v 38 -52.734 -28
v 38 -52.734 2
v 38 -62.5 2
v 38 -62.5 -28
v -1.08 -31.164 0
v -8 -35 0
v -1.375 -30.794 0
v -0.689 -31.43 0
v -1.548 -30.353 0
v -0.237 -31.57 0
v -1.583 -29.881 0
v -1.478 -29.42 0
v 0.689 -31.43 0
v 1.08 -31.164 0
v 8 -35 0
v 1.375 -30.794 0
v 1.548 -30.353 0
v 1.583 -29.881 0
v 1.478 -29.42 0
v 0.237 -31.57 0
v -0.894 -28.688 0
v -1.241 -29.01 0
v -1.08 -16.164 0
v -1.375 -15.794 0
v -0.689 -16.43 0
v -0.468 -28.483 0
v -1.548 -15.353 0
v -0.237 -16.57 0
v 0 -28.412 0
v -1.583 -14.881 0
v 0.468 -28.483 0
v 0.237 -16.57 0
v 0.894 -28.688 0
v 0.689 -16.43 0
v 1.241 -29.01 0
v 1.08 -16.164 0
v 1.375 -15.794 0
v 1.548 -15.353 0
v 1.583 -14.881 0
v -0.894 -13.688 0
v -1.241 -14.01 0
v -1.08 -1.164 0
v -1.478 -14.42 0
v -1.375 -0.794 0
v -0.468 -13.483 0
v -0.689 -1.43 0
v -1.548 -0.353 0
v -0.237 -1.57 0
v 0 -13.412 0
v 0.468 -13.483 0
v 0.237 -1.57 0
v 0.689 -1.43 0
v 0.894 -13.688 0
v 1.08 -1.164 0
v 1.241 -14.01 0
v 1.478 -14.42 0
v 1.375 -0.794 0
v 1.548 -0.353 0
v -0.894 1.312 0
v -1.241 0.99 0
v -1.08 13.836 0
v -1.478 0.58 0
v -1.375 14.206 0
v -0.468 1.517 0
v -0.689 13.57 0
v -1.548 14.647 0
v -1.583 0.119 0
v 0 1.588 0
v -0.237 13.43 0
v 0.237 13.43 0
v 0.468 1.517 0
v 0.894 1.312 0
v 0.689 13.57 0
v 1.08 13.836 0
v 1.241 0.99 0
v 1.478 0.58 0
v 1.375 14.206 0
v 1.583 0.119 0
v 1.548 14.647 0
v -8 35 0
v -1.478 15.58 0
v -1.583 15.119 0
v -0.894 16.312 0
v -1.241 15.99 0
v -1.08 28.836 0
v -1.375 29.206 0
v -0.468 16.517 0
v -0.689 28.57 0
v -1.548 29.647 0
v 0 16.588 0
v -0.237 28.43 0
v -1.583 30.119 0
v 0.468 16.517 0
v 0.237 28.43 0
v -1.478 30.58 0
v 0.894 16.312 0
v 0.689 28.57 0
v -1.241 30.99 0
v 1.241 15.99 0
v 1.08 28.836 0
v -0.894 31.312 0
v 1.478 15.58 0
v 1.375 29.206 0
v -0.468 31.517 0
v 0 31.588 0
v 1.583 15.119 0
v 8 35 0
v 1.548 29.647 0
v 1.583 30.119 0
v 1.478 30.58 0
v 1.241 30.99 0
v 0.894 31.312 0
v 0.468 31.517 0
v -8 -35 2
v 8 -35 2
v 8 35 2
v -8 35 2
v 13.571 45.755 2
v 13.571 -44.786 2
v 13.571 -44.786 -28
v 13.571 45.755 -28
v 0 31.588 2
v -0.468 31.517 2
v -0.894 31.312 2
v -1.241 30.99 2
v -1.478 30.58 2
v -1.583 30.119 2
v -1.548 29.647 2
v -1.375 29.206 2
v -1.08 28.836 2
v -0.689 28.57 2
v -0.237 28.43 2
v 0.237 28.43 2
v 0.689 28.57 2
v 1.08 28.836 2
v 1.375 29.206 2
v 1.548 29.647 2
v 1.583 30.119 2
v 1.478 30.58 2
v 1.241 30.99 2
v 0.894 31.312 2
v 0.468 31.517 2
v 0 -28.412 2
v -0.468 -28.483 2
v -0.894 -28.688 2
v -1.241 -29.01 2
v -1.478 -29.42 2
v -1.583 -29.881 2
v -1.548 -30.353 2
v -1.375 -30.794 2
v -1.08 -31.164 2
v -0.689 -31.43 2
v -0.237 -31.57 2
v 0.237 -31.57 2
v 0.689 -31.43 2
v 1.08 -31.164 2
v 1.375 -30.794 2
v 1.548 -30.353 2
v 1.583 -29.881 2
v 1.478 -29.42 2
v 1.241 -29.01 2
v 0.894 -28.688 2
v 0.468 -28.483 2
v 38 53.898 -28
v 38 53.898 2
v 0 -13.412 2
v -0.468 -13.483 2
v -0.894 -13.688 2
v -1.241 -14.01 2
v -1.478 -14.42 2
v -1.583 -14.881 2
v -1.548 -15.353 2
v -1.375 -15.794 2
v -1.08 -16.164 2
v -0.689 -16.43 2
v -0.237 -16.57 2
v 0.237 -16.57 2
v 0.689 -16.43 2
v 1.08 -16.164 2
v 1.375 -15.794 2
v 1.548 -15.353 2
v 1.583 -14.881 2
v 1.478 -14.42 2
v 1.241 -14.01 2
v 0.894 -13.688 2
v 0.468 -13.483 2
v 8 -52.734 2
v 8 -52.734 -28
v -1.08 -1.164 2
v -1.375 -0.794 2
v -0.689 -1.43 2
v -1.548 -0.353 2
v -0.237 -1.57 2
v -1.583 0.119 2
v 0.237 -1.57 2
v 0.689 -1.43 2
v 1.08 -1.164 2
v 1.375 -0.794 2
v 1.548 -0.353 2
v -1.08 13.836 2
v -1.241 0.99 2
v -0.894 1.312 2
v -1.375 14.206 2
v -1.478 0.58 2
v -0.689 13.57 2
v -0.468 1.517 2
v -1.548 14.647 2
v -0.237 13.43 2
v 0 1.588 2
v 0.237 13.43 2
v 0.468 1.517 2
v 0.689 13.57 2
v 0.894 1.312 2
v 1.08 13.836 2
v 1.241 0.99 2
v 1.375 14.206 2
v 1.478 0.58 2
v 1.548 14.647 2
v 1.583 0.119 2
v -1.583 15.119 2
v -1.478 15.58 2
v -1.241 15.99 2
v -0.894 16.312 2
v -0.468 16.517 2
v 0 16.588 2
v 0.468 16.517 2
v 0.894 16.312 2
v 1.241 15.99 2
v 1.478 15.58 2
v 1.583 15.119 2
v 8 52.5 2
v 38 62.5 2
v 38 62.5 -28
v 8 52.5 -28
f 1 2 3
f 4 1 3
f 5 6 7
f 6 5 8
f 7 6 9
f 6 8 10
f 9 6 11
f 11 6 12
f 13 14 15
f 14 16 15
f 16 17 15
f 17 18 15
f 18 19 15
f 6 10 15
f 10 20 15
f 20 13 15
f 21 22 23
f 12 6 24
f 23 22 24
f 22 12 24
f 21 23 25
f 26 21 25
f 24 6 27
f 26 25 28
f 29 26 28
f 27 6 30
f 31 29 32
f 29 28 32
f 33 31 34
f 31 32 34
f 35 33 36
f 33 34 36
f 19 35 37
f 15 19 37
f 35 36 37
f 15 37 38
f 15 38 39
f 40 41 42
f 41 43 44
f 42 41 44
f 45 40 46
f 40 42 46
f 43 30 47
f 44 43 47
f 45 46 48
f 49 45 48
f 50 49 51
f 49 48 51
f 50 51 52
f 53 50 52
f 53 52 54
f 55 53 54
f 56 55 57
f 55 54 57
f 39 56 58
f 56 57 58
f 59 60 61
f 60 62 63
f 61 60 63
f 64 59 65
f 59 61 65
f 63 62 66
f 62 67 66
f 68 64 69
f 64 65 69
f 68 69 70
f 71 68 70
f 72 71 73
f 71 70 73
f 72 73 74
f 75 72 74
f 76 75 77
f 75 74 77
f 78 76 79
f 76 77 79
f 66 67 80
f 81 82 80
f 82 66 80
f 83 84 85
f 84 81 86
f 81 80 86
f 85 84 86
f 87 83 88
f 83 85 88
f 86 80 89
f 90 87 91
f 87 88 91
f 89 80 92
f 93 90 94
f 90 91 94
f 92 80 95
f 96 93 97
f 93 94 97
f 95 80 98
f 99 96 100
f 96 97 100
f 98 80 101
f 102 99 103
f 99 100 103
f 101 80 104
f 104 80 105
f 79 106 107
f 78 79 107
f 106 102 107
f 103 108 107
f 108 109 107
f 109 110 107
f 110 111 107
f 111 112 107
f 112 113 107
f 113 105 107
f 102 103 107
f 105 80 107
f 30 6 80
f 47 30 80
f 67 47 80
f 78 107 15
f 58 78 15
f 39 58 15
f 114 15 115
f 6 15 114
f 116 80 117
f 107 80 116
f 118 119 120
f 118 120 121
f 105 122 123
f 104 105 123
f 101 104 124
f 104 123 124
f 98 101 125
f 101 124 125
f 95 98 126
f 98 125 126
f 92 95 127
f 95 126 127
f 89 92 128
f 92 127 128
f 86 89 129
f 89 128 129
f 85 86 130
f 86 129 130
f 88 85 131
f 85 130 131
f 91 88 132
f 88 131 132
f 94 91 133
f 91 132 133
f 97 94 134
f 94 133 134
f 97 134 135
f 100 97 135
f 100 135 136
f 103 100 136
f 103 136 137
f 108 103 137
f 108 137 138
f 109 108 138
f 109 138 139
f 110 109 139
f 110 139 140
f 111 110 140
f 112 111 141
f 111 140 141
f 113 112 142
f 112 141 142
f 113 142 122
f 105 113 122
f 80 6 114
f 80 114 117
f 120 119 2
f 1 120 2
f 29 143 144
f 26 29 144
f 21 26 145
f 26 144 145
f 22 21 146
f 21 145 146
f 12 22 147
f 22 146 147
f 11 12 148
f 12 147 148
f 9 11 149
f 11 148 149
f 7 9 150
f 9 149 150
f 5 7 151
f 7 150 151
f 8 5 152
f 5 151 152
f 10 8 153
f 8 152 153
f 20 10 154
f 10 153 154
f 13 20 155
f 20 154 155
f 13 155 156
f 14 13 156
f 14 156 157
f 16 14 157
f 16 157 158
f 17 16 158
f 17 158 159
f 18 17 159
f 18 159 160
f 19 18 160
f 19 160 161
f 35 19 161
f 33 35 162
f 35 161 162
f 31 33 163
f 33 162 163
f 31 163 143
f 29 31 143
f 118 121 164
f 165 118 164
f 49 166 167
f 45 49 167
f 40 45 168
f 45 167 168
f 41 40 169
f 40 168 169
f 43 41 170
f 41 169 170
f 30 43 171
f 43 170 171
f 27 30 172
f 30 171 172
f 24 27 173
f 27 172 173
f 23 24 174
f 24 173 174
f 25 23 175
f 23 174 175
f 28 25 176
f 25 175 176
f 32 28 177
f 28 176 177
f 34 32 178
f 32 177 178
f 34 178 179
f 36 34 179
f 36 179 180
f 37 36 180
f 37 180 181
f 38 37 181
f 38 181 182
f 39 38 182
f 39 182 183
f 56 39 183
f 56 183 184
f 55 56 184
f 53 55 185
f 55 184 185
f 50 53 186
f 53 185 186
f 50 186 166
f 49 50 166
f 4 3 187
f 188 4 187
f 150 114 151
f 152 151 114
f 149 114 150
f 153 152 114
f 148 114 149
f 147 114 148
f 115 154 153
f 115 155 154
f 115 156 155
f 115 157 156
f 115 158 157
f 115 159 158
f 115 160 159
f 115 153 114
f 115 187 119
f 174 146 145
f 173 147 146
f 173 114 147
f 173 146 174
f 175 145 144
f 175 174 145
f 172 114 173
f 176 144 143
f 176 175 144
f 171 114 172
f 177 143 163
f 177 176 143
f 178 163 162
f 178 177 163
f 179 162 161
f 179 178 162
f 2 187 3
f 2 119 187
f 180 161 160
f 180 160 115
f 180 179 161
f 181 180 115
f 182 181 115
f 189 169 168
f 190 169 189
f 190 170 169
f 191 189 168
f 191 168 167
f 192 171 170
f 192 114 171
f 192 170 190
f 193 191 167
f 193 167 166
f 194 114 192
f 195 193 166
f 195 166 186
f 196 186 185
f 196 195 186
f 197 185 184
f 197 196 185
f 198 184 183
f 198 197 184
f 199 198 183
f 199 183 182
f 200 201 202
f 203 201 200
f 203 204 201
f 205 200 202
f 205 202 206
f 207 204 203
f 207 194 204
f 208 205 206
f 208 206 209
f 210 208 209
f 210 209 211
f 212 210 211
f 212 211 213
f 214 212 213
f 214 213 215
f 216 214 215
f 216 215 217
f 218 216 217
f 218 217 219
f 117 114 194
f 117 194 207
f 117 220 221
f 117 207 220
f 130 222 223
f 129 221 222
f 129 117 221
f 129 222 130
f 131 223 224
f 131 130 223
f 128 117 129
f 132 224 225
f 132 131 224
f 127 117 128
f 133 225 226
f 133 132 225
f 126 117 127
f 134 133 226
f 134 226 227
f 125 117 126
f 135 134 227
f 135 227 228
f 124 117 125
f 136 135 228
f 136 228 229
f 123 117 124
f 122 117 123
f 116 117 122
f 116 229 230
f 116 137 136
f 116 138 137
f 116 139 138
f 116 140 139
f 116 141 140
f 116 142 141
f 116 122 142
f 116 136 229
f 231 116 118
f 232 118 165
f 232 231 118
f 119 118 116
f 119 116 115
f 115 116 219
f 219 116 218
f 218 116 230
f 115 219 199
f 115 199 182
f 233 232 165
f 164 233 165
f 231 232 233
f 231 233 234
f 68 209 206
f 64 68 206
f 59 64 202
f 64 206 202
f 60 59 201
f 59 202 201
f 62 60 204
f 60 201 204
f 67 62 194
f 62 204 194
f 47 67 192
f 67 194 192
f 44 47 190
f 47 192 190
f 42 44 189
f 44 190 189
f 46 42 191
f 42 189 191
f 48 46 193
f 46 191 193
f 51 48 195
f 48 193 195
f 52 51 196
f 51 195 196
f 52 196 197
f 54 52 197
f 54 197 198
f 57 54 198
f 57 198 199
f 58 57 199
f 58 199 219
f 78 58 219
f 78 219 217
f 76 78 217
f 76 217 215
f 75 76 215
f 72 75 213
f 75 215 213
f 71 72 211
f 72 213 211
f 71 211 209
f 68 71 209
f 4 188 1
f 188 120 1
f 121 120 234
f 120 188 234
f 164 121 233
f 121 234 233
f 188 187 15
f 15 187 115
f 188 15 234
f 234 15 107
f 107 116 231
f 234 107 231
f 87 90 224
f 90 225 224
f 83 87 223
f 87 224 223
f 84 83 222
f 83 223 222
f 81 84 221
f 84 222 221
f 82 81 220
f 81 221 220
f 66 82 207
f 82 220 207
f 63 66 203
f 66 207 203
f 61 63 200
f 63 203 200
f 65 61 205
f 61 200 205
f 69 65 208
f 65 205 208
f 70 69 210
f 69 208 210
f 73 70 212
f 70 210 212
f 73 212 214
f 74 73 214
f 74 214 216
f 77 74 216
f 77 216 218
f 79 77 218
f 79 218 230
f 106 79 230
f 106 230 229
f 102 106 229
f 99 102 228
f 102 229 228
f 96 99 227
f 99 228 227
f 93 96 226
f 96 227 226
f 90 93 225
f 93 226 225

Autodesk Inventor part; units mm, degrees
ref_plane "YZ Plane" through (0, 0, 0) normal (1, 0, 0) x (0, 1, 0)
ref_plane "XZ Plane" through (0, 0, 0) normal (0, 1, 0) x (-1, 0, 0)
ref_plane "XY Plane" through (0, 0, 0) normal (0, 0, 1) x (1, 0, 0)
sketch "Boceto1" plane through (0, 0, 0) normal (0, 0, 1) x (1, 0, 0)
  line L0 (-8, 35) -> (8, 35)
  line L1 (8, 35) -> (8, -35)
  line L2 (8, -35) -> (-8, -35)
  line L3 (-8, -35) -> (-8, 35)
  line L4 (-8, 35) -> (8, -35) construction
  line L5 (8, 35) -> (-8, -35) construction
  point P0 (0, 0)
  dimension "d0" = 16
  dimension "d1" = 70
extrude "Extrusión1" add sketch "Boceto1" along normal blind 2
sketch "Boceto2" plane through (0, 0, 2) normal (0, 0, 1) x (1, 0, 0)
  line L0 (38, -62.5) -> (8, -62.5)
  line L1 (8, -62.5) -> (8, 62.5)
  line L2 (8, 62.5) -> (38, 62.5)
  line L3 (38, 62.5) -> (38, -62.5)
  line L4 (38, -62.5) -> (8, 62.5) construction
  line L5 (8, -62.5) -> (38, 62.5) construction
  point P0 (0, 0)
  point P1 (23, 0)
  dimension "d4" = 30
  dimension "d5" = 125
extrude "Extrusión2" add sketch "Boceto2" against normal blind 30
sketch "Boceto3" plane through (0, 0, 2) normal (0, 0, 1) x (1, 0, 0)
  line L0 (38, 62.5) -> (38, -62.5) projected
  line L1 (13.5714, -44.7856) -> (13.5714, 45.755)
  line L2 (38, 45.755) -> (38, -44.7856)
  line L3 (13.5714, -44.7856) -> (38, -52.7345)
  line L4 (38, -52.7345) -> (38, -44.7856)
  line L5 (13.5714, 45.755) -> (38, 53.8978)
  line L6 (38, 45.755) -> (38, 53.8978)
  line L7 (8, -62.5) -> (8, -35) projected
  line L8 (38, -62.5) -> (8, -62.5) projected
  line L9 (8, -62.5) -> (38, -62.5)
  line L10 (38, -62.5) -> (8, -52.7345)
  line L11 (8, -52.7345) -> (8, -62.5)
  line L12 (8, -62.5) -> (8, 62.5) projected
  line L13 (8, 62.5) -> (38, 62.5)
  line L14 (38, 62.5) -> (8, 52.5)
  line L15 (8, 62.5) -> (38, 62.5) projected
  line L16 (8, 52.5) -> (8, 62.5)
  point P0 (0, 0)
extrude "Extrusión3" cut sketch "Boceto3" against normal through all contours L14 L12 L13 | L0 L3 L1 L5 | L10 L8 L7
sketch "Boceto4" plane through (0, 0, 0) normal (0, 0, -1) x (-1, 0, 0)
  point P0 (0, 0)
  point P1 (0, 0)
  point P2 (0, 15)
  point P3 (0, 30)
  point P4 (0, -15)
  point P5 (0, -30)
hole "Agujero1" at (0, 0, 0) at (0, 15, 0) at (0, 30, 0) at (0, -15, 0) at (0, -30, 0) direction (0, 0, 1) diameter 3.175 end through all
properties part number "Pala"
